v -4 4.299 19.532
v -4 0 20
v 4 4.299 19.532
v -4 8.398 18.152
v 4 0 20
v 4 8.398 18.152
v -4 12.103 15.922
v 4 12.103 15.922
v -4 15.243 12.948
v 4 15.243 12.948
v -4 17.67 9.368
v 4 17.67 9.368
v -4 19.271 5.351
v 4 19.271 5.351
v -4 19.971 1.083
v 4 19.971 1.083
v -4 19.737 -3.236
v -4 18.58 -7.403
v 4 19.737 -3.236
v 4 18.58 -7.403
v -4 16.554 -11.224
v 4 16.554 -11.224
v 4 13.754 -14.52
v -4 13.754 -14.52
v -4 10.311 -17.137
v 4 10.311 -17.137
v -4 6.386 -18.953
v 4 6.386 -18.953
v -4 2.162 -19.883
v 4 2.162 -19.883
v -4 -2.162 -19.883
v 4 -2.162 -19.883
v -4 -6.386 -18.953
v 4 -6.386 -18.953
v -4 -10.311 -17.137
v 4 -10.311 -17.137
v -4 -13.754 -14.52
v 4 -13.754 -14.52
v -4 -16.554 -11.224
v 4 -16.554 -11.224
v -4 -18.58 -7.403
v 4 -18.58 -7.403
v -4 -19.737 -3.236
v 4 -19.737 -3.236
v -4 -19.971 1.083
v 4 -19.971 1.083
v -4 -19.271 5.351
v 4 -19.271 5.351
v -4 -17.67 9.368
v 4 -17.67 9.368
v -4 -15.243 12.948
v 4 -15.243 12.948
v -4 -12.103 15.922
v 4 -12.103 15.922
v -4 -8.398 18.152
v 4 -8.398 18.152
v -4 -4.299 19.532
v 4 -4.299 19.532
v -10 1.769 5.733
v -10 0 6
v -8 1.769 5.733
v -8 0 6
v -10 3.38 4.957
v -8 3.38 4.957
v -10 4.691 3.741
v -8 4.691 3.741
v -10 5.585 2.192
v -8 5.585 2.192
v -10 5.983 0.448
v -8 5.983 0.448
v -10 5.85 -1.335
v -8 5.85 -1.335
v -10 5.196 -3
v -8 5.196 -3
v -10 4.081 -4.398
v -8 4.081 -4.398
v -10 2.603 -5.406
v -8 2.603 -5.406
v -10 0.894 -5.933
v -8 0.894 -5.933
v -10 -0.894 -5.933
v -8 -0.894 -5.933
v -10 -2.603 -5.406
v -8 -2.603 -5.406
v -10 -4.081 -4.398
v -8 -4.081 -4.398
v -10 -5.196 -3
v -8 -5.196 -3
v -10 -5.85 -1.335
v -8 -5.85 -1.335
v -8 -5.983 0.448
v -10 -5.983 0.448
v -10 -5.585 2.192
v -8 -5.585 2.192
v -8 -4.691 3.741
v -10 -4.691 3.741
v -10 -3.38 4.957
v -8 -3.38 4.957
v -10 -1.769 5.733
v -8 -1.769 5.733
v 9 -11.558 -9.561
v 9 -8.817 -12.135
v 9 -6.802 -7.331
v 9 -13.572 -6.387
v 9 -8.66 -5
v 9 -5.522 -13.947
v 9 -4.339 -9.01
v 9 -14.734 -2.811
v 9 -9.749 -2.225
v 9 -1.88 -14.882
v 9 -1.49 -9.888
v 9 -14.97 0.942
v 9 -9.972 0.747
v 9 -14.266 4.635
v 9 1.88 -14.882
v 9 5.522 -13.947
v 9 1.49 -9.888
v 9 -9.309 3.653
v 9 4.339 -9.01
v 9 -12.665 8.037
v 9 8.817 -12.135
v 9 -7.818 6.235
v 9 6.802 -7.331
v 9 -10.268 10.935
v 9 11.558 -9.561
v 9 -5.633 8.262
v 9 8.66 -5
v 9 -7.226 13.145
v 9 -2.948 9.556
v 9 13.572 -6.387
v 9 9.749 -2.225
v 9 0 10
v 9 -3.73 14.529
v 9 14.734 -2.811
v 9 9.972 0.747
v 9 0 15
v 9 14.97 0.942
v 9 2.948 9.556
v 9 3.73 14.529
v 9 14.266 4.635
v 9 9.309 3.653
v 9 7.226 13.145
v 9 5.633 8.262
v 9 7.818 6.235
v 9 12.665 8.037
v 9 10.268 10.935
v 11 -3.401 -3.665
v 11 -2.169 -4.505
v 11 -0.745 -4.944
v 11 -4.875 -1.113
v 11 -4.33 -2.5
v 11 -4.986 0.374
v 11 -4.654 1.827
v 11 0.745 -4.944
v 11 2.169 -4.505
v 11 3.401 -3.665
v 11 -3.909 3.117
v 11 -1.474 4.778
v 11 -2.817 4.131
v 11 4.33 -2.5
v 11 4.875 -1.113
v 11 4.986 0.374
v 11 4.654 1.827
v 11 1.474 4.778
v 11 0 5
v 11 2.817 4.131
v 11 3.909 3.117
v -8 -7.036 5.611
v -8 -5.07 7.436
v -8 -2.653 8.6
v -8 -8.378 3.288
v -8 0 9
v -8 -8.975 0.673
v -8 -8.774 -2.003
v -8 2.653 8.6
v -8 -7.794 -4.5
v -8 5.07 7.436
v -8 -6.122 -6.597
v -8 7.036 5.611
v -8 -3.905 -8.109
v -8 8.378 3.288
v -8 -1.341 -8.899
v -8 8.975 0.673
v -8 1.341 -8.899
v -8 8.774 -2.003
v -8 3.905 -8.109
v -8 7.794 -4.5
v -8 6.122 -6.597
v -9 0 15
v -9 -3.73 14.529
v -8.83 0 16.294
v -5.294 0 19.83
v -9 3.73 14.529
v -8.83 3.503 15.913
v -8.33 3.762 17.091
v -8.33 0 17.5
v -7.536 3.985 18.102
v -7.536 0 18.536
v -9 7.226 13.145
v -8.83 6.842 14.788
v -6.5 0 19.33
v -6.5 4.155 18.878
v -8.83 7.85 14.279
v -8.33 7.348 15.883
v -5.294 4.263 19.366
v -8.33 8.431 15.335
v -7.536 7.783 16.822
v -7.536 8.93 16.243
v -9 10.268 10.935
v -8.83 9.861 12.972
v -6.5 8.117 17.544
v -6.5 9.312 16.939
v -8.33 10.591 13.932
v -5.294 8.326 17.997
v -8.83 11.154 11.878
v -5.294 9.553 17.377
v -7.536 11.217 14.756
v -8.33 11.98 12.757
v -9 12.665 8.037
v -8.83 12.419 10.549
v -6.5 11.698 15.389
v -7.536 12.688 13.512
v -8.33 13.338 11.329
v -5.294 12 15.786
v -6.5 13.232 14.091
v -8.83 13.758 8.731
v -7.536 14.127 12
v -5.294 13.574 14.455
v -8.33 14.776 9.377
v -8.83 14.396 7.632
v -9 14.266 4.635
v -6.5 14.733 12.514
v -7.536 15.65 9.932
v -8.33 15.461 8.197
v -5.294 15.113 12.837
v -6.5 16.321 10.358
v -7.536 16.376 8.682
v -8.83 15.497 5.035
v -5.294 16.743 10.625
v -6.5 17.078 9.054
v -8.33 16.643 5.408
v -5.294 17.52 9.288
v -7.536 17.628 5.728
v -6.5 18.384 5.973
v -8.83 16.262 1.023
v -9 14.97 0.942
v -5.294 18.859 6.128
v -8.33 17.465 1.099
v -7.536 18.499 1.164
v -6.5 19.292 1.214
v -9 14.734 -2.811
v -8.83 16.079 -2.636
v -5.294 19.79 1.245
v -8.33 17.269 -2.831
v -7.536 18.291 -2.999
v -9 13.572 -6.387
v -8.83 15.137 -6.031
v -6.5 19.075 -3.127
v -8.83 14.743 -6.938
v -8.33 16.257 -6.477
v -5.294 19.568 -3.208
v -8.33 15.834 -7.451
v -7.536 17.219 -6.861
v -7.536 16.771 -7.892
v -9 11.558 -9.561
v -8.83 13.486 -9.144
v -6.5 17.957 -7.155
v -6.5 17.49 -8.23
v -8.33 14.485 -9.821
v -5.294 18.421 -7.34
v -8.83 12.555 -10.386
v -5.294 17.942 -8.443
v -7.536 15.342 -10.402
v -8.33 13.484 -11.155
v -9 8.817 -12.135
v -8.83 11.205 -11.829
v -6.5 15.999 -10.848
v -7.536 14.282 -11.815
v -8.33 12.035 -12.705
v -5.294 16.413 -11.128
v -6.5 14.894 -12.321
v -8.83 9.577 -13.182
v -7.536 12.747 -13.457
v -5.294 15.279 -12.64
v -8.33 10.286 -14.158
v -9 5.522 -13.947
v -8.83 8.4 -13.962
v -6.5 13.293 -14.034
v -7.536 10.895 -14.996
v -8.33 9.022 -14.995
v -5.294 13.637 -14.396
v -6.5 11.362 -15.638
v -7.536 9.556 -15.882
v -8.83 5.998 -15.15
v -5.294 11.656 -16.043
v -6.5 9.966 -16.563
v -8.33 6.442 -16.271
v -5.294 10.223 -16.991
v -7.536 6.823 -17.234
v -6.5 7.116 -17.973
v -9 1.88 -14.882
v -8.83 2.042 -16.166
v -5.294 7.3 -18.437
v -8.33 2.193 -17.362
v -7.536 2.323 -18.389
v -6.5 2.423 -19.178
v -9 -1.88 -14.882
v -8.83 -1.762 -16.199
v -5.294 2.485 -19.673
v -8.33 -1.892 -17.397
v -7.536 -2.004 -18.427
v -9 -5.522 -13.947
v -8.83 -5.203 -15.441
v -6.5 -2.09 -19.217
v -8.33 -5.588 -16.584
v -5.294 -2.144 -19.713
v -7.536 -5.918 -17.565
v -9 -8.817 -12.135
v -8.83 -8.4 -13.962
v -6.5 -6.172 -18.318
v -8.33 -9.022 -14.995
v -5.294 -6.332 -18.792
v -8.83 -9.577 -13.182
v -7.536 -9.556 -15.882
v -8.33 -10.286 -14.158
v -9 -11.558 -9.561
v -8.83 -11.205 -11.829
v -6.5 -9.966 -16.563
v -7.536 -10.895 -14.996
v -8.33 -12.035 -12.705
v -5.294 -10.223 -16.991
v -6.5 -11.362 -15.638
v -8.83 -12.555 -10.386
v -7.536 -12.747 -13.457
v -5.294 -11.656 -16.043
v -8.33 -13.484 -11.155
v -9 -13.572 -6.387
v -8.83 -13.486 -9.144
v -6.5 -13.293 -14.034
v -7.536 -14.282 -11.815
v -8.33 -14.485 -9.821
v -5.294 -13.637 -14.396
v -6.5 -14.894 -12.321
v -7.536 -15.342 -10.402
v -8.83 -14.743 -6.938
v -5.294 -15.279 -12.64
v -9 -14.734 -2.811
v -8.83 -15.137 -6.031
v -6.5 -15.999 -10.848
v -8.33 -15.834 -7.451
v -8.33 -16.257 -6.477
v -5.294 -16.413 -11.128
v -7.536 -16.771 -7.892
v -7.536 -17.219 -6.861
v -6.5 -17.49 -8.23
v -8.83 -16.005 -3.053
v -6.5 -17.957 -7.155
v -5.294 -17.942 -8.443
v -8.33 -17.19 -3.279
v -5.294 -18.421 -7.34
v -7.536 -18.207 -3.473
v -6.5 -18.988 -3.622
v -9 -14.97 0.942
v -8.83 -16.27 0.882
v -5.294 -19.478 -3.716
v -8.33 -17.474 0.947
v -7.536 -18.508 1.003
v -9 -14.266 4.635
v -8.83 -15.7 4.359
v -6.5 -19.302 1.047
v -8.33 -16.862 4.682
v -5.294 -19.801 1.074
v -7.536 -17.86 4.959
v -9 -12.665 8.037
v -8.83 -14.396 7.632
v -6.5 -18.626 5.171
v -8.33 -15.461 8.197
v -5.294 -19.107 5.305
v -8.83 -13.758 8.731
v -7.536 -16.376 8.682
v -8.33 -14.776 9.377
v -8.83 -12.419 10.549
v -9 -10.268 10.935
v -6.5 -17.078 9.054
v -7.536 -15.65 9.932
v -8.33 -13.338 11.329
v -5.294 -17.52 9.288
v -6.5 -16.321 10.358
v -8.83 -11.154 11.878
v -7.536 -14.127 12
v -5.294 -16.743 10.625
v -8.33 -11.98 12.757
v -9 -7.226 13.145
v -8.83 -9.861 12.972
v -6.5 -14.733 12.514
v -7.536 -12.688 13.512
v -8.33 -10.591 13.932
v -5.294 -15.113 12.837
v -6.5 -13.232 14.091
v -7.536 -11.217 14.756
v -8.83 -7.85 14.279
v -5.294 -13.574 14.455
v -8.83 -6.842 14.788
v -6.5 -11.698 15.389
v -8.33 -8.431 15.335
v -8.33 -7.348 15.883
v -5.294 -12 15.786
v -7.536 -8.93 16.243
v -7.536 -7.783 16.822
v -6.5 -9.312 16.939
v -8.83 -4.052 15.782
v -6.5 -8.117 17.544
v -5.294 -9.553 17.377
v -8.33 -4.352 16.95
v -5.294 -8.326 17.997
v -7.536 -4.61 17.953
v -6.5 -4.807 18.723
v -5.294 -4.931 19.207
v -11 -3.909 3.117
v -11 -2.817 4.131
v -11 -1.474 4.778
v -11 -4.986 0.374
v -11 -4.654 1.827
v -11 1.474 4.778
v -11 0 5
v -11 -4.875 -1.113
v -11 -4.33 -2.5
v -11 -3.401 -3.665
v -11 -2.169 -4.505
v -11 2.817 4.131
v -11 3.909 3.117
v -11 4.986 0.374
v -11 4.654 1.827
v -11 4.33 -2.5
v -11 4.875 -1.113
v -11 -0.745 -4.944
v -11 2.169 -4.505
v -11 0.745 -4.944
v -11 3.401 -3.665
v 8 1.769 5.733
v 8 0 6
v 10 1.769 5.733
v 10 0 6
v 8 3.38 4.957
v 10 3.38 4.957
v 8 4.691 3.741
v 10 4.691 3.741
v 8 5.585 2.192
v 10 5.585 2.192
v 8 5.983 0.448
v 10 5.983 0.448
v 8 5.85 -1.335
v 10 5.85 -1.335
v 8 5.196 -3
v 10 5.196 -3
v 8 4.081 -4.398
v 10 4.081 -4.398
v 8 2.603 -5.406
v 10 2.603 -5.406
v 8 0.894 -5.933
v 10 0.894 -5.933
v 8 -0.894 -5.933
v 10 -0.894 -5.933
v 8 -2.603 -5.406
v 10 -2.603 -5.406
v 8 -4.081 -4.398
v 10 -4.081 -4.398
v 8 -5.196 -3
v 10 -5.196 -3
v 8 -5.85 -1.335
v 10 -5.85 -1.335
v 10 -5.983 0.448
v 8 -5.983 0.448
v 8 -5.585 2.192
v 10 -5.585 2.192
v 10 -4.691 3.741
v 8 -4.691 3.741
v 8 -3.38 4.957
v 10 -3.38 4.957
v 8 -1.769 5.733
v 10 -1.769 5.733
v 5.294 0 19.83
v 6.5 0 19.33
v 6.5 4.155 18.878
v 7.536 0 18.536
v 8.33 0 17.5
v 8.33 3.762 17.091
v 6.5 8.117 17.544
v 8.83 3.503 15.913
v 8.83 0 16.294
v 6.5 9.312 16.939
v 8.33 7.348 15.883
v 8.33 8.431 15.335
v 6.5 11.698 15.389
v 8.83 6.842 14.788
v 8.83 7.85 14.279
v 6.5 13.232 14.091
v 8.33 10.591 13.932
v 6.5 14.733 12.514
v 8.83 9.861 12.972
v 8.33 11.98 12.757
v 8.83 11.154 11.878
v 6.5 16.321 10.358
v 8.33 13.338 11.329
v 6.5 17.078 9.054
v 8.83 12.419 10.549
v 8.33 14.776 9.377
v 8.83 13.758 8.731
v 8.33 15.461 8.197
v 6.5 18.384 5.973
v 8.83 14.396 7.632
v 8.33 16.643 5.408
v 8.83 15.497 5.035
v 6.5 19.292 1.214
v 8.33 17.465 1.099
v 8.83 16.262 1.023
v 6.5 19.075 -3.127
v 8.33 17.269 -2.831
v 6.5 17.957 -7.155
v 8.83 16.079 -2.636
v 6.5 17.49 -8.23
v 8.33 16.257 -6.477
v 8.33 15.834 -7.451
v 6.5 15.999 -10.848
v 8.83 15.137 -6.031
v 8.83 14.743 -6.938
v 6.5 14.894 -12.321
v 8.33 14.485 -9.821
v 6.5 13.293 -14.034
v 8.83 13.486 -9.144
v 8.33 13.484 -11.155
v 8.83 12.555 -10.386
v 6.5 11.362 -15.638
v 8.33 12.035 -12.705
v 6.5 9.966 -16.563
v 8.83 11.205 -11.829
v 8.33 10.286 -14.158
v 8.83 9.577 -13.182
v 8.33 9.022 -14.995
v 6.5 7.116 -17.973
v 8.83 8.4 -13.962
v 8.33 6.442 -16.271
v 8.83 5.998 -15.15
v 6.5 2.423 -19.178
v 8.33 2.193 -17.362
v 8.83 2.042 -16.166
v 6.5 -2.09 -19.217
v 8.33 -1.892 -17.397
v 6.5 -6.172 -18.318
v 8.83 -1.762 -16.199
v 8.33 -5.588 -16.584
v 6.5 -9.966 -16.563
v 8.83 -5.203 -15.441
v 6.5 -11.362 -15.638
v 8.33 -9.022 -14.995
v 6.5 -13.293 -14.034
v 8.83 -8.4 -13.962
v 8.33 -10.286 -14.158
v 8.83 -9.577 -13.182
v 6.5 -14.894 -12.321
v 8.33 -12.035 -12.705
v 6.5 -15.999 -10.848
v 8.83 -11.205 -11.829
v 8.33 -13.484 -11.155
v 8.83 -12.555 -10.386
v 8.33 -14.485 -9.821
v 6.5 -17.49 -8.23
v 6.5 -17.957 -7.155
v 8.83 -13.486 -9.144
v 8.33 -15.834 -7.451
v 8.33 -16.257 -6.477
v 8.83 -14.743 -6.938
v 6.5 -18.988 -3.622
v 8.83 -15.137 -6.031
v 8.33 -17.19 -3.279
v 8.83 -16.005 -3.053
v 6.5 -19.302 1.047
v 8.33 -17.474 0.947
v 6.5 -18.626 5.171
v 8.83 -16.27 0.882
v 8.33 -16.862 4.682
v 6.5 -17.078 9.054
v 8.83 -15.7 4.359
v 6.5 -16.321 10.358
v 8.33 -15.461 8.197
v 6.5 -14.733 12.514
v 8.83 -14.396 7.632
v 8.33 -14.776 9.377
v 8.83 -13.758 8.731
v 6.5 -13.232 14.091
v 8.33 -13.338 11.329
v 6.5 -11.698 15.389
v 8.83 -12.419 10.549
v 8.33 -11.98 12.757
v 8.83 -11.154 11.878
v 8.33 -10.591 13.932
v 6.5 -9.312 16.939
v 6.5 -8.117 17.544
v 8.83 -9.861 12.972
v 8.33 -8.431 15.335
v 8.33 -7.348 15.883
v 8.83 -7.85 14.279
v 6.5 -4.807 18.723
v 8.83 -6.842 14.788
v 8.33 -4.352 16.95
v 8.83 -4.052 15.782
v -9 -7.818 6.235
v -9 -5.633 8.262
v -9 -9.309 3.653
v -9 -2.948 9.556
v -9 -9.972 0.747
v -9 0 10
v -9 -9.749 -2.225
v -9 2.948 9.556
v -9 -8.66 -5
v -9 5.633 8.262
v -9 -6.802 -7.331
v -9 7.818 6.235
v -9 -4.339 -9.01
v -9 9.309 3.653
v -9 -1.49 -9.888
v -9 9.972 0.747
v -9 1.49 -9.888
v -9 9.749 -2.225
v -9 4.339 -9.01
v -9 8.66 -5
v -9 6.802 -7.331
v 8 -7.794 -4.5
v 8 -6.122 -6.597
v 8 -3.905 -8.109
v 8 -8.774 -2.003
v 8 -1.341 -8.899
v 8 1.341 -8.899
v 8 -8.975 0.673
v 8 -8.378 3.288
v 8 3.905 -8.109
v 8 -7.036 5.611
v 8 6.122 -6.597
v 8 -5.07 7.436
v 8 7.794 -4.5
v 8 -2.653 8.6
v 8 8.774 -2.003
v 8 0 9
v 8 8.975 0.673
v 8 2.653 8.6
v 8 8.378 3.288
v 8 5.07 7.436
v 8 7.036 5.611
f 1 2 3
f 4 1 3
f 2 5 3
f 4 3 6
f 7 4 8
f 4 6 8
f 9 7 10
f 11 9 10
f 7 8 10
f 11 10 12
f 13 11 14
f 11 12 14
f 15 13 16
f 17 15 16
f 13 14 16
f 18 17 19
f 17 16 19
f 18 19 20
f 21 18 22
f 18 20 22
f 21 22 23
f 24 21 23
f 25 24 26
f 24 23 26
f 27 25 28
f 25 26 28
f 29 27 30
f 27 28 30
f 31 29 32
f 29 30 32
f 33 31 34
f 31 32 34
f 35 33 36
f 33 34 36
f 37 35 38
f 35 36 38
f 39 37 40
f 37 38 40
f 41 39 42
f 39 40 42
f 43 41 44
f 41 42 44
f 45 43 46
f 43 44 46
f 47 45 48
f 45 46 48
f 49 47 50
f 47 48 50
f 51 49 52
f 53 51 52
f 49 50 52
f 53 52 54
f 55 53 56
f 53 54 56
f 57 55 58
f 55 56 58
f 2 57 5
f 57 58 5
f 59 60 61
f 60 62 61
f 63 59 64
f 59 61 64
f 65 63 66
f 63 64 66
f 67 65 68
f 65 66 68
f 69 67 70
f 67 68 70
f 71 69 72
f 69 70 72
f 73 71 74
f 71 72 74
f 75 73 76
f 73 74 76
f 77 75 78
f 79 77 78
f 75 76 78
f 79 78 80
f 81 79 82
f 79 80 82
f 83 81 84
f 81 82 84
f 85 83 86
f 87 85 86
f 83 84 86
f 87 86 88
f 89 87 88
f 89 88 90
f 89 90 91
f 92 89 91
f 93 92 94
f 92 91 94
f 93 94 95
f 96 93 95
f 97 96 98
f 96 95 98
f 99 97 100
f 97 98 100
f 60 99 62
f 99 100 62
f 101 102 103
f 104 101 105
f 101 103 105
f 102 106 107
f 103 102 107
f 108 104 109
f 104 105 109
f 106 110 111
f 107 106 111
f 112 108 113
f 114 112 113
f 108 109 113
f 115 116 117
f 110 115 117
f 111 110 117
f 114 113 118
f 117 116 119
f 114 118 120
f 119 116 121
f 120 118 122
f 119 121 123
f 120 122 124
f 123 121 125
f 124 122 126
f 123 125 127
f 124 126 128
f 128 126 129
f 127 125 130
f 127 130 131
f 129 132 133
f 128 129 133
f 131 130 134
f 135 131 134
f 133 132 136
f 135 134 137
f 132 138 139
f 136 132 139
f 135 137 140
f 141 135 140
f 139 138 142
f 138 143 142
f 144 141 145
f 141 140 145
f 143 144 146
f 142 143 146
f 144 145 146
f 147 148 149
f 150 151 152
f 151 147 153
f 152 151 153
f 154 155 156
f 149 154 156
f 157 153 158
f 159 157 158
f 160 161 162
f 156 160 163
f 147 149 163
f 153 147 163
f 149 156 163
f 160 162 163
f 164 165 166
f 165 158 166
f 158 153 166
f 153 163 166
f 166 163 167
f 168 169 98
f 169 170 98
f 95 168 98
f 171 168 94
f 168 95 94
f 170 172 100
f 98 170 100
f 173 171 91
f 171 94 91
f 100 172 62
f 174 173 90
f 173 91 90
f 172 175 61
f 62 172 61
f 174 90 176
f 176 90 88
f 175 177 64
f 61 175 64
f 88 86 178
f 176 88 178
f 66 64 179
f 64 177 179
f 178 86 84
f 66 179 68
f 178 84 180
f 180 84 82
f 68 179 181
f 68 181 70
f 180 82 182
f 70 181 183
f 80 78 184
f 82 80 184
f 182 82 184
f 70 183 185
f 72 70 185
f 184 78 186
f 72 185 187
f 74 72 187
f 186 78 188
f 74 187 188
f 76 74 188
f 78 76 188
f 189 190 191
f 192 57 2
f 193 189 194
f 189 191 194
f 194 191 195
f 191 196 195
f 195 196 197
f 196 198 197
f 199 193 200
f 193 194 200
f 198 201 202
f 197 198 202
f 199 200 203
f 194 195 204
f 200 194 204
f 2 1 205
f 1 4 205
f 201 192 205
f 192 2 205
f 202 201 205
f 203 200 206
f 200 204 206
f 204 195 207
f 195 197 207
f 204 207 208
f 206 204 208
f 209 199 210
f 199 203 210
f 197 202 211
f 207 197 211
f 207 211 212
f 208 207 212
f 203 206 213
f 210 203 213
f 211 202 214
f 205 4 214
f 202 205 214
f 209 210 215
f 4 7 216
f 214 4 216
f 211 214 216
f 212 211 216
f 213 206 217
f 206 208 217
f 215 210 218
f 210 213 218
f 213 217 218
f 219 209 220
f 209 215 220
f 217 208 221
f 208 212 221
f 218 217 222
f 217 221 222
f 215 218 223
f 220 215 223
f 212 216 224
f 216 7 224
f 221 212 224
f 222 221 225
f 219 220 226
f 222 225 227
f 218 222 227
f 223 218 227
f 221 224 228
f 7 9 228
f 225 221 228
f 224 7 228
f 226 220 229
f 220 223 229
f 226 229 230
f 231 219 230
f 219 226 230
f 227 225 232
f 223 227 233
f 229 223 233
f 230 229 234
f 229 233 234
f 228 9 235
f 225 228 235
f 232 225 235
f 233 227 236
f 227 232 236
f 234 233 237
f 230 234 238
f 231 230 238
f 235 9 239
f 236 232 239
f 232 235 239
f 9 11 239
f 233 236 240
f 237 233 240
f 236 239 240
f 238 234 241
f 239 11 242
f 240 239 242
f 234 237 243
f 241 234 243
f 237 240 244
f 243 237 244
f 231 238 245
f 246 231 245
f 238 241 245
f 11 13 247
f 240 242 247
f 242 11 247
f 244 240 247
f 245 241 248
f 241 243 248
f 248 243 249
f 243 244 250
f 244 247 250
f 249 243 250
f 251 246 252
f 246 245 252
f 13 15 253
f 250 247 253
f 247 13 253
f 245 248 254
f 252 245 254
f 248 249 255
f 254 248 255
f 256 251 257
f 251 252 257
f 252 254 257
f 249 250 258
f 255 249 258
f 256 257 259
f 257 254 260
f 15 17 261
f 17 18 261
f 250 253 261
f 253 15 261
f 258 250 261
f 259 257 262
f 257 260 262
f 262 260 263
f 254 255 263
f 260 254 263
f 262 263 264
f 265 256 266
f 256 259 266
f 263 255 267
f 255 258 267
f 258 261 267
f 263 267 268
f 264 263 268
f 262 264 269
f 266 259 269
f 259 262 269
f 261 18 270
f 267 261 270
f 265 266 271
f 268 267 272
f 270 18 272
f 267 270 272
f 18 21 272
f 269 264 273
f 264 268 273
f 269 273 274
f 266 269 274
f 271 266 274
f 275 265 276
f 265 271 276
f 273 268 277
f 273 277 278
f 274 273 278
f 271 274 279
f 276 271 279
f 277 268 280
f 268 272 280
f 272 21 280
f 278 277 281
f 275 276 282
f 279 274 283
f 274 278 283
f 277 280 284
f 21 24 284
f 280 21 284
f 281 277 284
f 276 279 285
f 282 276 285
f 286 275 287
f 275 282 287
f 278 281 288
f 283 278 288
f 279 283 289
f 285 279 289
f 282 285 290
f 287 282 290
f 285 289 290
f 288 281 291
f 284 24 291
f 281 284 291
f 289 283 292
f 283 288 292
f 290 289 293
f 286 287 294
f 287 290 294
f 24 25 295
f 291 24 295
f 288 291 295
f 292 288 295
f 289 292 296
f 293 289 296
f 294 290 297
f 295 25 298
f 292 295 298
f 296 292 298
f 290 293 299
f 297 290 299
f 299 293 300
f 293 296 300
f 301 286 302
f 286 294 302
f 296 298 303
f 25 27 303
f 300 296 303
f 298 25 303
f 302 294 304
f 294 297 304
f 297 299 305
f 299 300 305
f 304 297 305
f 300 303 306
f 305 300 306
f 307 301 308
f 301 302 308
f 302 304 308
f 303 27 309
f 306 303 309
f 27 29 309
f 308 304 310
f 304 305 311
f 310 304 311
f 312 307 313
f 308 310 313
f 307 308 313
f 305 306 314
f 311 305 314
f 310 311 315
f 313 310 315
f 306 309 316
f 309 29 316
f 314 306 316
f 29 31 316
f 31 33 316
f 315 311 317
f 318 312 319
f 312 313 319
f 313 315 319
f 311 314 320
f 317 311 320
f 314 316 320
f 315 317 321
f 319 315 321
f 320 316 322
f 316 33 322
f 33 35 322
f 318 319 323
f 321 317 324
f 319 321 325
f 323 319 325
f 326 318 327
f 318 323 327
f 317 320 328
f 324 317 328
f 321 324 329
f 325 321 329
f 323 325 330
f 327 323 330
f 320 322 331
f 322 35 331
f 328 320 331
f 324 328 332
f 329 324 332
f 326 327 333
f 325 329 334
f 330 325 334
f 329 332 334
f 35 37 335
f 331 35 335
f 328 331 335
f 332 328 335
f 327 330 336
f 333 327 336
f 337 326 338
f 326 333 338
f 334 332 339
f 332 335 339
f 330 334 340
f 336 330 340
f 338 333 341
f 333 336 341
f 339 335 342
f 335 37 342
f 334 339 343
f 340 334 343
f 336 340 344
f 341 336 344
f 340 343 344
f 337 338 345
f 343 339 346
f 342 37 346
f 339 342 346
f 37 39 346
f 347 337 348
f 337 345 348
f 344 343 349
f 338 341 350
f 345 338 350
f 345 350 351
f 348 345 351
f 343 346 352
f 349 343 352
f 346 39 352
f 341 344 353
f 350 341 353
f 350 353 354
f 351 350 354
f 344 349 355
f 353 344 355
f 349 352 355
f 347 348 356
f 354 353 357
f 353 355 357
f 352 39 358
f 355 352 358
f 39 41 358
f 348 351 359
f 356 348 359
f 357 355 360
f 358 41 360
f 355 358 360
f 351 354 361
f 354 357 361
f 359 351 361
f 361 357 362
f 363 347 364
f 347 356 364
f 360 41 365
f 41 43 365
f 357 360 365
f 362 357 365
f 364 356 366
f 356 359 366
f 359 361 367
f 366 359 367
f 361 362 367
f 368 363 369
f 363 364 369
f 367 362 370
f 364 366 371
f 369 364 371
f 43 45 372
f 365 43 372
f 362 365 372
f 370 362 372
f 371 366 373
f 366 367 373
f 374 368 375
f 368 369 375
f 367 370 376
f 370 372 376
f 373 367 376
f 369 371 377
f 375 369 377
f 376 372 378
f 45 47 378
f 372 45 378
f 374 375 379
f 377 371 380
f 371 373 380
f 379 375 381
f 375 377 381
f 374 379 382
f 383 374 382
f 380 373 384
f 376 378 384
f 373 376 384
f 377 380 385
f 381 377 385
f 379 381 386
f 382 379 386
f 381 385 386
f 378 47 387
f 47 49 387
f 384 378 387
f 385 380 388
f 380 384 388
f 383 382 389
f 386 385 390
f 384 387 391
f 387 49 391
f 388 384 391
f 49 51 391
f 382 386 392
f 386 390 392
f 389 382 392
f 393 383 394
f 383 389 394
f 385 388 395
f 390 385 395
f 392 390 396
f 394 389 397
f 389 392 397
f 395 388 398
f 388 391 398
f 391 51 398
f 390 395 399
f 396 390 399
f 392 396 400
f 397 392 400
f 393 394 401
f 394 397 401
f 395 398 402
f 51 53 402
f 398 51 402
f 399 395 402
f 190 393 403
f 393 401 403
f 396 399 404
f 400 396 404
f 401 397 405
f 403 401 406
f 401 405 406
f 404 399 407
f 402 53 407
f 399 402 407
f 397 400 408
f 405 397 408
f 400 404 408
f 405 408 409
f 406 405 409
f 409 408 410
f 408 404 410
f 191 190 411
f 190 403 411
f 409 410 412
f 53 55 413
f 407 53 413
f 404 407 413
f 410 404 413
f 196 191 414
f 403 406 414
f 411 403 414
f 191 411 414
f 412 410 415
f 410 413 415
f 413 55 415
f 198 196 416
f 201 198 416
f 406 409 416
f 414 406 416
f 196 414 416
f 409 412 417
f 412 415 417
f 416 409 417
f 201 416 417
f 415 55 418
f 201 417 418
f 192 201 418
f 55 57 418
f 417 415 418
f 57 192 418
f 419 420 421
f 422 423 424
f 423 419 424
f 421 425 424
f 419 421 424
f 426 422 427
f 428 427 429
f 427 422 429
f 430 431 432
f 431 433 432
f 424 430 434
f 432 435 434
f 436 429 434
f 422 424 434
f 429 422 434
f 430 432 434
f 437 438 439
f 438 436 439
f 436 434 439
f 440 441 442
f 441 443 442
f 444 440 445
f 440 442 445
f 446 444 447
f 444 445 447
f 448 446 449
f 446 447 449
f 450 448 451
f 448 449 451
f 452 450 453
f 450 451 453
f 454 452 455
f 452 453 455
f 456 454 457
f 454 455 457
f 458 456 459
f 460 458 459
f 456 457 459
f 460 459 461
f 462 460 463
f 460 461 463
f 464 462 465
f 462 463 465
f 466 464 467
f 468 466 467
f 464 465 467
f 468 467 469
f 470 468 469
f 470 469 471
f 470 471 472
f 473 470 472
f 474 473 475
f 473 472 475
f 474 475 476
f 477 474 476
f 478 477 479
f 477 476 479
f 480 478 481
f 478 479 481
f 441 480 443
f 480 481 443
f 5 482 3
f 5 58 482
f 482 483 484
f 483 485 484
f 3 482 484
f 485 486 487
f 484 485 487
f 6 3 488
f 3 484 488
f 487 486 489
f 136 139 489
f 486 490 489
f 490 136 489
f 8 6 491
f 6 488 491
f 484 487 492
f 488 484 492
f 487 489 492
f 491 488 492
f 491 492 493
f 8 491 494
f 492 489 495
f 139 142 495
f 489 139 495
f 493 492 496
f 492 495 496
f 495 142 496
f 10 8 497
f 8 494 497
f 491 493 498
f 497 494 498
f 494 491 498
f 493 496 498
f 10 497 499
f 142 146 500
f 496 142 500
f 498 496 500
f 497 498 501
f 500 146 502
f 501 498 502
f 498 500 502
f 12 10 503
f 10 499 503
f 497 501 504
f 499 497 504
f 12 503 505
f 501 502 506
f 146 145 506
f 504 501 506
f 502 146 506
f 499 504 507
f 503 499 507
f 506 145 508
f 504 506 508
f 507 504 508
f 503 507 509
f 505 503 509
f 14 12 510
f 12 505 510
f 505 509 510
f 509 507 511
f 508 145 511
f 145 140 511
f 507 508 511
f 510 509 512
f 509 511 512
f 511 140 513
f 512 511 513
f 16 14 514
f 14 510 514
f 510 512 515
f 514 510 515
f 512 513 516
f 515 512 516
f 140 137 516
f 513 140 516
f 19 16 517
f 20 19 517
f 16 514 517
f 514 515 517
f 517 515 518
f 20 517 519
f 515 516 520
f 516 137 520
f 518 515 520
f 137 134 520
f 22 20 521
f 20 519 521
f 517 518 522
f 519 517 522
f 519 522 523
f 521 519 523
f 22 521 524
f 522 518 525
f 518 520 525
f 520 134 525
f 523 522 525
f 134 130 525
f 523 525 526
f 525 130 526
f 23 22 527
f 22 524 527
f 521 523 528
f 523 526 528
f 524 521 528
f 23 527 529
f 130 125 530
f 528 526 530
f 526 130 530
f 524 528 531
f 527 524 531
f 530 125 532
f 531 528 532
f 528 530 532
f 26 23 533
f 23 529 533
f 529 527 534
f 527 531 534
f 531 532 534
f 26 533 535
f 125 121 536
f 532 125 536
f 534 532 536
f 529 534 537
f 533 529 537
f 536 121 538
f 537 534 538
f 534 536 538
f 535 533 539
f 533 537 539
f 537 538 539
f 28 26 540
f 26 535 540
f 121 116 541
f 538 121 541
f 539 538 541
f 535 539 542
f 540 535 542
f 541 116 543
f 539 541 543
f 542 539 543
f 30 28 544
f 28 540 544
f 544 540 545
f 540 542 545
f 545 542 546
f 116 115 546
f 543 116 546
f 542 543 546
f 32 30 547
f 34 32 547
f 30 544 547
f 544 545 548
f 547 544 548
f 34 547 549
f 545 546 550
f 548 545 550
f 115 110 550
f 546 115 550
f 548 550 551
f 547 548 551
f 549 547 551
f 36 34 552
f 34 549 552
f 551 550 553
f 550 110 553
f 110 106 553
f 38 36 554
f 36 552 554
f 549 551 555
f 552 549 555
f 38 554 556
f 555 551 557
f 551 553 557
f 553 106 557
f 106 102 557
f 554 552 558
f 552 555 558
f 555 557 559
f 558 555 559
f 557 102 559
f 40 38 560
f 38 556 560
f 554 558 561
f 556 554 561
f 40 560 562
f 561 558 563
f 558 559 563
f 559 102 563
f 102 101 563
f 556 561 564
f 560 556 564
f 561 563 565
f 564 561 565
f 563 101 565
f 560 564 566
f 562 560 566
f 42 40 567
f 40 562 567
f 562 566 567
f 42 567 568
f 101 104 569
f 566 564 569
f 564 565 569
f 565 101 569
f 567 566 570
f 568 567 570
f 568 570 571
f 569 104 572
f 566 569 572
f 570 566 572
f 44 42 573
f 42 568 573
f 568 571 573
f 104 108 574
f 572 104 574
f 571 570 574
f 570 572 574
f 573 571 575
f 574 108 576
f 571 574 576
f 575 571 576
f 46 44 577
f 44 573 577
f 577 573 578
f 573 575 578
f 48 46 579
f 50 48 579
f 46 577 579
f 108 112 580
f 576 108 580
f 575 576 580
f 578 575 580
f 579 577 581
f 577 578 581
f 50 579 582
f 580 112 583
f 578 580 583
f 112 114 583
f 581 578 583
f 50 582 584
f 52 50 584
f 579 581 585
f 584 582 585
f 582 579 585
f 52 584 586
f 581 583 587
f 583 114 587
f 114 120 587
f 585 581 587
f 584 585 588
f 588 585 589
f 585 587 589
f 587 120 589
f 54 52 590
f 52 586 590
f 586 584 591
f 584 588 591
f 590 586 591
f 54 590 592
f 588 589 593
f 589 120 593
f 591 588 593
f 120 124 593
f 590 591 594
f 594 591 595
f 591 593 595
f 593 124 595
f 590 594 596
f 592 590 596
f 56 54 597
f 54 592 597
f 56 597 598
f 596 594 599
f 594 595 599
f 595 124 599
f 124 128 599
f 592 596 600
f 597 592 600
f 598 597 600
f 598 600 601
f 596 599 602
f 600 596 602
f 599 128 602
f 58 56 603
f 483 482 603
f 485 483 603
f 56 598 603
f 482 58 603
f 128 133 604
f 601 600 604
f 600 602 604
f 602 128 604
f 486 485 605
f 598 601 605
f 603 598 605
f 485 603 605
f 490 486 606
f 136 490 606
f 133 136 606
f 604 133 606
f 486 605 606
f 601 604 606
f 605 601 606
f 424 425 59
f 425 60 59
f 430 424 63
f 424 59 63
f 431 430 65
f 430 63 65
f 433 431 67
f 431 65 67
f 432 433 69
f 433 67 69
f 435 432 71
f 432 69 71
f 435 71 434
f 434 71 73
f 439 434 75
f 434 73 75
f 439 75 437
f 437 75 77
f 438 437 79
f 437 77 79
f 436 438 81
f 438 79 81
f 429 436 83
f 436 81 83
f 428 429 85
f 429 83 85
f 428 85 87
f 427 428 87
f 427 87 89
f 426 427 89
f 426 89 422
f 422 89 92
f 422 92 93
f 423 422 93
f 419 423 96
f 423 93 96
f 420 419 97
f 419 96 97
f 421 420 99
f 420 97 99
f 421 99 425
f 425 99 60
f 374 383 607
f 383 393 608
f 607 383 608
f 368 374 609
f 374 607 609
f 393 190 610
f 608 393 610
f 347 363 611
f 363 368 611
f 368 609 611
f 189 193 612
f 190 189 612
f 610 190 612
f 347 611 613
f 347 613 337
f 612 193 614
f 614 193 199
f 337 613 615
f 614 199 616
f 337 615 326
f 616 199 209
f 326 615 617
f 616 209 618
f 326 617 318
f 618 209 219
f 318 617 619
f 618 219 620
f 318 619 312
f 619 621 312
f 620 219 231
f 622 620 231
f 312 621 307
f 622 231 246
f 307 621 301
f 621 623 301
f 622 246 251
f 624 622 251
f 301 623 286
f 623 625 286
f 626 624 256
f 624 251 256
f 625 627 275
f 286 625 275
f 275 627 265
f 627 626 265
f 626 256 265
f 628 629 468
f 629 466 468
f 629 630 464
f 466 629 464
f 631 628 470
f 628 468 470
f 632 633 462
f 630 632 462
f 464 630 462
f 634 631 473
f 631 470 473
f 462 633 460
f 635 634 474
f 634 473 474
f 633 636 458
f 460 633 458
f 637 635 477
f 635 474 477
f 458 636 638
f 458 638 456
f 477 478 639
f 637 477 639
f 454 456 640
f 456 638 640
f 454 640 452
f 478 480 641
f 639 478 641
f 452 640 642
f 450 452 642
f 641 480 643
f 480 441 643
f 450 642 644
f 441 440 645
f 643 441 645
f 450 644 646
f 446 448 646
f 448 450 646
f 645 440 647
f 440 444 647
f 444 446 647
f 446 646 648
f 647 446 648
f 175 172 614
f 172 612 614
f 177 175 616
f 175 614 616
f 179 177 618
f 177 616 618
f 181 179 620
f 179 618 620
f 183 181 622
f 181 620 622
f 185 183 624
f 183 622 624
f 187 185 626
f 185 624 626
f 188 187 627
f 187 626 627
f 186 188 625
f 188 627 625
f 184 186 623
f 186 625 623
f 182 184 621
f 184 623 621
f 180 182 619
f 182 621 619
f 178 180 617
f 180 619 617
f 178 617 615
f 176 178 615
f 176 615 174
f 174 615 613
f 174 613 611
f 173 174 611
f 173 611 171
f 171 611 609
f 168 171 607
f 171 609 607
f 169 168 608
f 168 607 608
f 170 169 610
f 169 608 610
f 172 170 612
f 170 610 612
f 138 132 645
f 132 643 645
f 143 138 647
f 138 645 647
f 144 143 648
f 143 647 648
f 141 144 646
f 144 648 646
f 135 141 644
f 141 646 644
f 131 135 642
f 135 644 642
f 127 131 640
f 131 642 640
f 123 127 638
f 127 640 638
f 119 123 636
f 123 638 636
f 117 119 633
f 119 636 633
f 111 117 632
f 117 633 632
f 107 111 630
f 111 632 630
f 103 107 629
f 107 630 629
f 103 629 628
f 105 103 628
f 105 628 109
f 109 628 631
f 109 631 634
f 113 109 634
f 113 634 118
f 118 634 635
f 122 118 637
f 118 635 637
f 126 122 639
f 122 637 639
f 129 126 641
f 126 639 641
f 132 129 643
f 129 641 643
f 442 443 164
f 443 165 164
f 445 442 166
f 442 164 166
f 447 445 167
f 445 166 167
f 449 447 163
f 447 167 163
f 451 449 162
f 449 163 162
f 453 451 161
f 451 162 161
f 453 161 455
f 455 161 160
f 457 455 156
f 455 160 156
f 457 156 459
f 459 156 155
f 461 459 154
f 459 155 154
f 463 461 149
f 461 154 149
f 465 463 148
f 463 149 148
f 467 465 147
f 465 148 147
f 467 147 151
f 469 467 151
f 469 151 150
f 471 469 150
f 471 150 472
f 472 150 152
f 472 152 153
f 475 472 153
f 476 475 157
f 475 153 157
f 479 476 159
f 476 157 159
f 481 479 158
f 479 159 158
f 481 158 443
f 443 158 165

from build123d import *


with BuildPart() as part:
    # 草图1 → 旋转1 (revolve)
    with BuildSketch(Plane.XY):
        with BuildLine():
            Line((-11, 0), (-11, 5))
            Line((-11, 5), (-10, 6))
            Line((-10, 6), (-8, 6))
            Line((-8, 6), (-8, 9))
            Line((-8, 9), (-9, 10))
            Line((-9, 10), (-9, 15))
            ThreePointArc((-9, 15), (-7.535533906, 18.535533906), (-4, 20))
            Line((-4, 20), (4, 20))
            ThreePointArc((4, 20), (7.535533906, 18.535533906), (9, 15))
            Line((9, 15), (9, 10))
            Line((9, 10), (8, 9))
            Line((8, 9), (8, 6))
            Line((8, 6), (10, 6))
            Line((10, 6), (11, 5))
            Line((11, 5), (11, 0))
            Line((11, 0), (-11, 0))
        make_face()
    revolve(axis=Axis((11, 0, 0), (-1, 0, 0)))


solid = part.part
